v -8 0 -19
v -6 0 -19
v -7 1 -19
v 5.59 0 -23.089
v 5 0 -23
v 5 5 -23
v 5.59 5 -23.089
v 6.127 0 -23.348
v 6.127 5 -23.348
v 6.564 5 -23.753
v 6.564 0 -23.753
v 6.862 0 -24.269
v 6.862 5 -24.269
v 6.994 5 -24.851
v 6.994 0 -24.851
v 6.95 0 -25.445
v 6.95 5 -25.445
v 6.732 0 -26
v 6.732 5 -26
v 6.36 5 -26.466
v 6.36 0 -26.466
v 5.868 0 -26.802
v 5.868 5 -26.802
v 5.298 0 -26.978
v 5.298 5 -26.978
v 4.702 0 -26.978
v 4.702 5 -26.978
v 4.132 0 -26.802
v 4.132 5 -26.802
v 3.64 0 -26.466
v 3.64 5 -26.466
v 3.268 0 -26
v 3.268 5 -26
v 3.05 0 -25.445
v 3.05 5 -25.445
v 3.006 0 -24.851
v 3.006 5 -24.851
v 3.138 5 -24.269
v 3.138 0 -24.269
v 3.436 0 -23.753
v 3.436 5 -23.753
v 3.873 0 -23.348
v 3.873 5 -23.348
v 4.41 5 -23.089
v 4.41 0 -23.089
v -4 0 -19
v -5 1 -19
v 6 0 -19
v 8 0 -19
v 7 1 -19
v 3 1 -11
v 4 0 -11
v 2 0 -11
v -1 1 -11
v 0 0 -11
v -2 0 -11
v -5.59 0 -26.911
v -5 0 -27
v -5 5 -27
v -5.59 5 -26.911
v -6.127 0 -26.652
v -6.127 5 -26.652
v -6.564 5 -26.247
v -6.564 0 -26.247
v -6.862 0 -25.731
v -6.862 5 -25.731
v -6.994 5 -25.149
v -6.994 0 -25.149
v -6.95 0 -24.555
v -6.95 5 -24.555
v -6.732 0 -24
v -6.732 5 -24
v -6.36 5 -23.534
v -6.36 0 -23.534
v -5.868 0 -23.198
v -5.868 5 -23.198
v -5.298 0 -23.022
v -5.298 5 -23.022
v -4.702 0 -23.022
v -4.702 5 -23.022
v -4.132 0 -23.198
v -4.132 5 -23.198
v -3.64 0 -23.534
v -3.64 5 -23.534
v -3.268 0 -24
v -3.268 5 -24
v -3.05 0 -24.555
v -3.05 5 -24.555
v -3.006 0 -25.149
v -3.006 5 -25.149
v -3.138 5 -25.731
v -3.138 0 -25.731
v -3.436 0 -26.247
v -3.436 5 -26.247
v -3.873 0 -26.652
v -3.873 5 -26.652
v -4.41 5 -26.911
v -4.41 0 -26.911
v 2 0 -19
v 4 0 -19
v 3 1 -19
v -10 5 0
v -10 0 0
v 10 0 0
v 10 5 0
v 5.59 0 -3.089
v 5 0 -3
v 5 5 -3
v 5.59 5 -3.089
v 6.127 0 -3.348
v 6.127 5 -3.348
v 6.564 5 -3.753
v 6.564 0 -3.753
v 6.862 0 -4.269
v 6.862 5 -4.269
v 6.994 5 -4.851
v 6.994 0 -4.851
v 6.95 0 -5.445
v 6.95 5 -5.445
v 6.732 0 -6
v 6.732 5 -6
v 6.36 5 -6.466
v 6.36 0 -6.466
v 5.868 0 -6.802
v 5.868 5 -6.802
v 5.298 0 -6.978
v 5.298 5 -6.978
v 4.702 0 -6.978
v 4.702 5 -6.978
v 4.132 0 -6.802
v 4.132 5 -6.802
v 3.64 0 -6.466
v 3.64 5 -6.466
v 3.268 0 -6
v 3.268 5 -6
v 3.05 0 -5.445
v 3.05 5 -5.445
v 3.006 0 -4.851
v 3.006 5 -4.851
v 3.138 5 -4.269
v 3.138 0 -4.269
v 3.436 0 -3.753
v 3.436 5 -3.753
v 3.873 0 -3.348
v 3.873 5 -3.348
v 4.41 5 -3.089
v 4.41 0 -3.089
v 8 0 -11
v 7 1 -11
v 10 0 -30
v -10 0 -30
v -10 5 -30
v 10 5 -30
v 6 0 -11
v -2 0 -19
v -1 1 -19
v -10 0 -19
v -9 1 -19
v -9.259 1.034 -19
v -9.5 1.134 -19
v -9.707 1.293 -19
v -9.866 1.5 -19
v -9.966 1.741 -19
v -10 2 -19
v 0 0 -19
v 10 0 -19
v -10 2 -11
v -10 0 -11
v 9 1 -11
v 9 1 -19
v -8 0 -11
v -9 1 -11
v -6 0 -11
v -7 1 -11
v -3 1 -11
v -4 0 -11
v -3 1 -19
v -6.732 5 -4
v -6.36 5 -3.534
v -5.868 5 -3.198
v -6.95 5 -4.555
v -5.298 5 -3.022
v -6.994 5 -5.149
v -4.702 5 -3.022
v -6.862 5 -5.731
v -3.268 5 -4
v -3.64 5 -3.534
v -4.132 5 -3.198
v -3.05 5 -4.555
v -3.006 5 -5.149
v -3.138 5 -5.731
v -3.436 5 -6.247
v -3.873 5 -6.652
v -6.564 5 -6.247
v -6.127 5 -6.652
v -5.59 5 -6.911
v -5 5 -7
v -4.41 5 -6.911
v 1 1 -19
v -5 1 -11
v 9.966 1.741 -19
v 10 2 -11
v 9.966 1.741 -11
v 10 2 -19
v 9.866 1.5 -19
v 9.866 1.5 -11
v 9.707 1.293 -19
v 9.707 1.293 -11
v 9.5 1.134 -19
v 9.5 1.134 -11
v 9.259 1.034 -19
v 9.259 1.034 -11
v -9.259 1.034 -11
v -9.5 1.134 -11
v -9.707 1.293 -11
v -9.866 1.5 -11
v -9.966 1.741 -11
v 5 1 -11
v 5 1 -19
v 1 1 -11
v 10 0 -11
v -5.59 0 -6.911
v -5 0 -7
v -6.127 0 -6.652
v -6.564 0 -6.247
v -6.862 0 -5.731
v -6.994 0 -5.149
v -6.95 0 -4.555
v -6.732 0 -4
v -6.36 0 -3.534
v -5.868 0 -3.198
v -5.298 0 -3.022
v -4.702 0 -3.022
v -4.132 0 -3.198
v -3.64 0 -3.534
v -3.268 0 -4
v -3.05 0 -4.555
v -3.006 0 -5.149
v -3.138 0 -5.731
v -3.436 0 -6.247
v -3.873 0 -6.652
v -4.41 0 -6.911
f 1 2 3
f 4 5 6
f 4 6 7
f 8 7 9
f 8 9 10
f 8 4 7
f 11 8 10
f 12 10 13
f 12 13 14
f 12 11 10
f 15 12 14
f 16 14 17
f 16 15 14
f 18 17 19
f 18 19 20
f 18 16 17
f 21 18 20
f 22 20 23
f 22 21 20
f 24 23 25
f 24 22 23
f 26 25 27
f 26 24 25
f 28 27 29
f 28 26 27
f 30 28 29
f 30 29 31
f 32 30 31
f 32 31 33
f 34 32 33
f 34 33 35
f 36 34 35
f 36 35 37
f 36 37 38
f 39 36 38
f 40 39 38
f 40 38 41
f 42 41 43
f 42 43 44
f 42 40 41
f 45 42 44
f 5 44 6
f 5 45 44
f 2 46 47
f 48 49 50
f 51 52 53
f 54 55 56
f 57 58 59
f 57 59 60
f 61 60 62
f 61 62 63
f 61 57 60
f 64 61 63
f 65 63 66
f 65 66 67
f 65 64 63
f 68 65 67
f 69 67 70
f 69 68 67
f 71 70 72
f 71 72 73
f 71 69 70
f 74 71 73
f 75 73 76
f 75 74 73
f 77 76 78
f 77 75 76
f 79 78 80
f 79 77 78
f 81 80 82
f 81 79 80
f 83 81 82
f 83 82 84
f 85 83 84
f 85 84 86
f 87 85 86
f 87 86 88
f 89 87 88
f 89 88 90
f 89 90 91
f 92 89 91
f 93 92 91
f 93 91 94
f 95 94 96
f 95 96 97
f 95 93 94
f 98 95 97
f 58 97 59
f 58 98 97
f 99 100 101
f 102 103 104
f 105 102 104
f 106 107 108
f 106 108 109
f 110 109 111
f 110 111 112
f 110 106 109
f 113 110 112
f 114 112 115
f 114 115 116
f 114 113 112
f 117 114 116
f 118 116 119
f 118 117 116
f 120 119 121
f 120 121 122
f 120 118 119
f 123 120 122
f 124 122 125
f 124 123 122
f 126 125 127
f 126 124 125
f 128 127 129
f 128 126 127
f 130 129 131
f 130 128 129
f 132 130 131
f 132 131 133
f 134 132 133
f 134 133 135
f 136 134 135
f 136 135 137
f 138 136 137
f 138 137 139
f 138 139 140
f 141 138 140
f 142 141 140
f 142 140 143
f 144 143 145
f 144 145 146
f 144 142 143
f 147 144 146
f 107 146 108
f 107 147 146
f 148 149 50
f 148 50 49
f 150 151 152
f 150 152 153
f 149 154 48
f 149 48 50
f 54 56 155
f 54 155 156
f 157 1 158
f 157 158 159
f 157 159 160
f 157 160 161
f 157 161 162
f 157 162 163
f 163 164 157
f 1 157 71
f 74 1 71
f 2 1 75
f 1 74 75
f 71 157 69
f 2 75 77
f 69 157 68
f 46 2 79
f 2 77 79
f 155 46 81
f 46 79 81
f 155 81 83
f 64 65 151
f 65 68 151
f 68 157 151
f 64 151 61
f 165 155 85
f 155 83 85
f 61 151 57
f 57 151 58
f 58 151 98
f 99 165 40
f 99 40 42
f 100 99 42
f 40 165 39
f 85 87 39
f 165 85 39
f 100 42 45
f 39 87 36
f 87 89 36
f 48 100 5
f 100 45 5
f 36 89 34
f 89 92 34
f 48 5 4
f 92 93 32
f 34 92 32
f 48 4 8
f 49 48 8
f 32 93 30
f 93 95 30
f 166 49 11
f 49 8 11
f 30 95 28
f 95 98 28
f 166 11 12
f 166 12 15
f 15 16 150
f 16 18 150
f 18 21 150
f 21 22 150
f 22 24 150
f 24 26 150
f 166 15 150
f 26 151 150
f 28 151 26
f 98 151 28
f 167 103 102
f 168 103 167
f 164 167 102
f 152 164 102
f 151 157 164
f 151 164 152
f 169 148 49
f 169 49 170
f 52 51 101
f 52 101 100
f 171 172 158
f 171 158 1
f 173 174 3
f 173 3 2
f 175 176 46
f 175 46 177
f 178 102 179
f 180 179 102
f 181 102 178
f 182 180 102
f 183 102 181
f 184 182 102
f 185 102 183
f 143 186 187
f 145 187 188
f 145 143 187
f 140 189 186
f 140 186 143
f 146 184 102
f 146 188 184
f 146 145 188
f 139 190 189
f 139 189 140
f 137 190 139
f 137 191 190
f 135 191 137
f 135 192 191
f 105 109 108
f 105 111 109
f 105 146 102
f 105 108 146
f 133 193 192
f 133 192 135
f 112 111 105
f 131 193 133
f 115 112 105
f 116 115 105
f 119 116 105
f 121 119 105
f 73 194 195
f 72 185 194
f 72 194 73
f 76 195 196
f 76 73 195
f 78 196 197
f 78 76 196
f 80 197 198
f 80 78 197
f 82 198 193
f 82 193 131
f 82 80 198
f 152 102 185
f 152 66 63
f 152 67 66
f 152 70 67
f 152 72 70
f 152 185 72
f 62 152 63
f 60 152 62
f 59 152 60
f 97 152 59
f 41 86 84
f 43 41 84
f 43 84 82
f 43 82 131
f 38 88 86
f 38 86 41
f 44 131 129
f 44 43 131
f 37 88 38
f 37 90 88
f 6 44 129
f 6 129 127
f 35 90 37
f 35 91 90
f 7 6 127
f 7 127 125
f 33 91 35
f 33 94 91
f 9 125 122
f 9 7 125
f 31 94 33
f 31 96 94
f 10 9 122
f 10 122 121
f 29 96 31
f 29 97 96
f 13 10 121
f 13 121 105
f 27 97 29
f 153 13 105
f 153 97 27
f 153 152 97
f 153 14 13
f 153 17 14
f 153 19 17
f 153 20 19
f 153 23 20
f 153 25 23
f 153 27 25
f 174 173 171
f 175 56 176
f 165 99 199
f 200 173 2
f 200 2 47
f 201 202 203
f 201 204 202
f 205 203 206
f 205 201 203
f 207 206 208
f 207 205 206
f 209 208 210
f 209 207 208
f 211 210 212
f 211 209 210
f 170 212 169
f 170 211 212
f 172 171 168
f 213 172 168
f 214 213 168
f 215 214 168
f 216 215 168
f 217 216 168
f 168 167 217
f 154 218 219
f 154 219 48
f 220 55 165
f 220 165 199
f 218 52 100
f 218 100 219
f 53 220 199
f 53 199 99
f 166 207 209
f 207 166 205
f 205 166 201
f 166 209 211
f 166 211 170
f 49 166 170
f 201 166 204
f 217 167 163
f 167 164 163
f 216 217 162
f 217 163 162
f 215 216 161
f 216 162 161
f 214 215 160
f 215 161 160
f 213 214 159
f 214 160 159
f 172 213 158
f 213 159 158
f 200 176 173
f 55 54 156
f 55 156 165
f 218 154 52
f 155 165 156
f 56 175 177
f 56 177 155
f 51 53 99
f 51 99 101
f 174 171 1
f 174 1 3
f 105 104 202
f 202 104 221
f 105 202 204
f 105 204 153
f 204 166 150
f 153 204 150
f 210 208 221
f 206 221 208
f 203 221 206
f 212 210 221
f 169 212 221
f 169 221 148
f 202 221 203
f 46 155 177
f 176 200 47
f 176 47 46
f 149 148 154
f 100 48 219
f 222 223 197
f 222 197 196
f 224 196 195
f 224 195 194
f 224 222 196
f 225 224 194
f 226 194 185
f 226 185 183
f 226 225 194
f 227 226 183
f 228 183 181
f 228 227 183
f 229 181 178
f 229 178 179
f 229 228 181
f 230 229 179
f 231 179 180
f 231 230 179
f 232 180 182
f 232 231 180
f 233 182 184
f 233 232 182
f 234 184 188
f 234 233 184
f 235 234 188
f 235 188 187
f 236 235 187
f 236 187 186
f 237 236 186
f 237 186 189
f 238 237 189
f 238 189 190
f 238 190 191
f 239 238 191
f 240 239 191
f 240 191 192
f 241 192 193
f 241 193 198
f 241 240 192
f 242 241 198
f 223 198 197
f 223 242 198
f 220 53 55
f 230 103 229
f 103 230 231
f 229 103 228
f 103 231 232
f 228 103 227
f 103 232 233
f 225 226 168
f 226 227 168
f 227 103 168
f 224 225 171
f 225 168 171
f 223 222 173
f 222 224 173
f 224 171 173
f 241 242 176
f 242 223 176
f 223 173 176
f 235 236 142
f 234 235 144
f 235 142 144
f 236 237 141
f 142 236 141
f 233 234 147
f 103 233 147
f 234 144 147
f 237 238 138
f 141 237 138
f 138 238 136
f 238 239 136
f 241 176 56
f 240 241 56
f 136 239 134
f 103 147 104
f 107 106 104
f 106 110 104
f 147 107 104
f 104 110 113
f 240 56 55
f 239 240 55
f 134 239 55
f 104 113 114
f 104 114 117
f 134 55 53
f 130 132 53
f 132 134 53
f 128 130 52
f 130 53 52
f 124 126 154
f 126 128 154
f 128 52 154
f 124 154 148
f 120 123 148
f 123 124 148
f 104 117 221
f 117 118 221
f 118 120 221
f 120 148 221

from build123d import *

# Parameters (mm, degrees)
SKETCH_1_W               = 20
SKETCH_1_H               = 30
SKETCH_1_R               = 2
EXTRUDE_1_DEPTH          = 5
CUT_EXTRUDE_6_DEPTH      = 4
CUT_EXTRUDE_6_DEPTH_BACK = 4
CUT_EXTRUDE_6_START      = -15
FILLET_1_R               = 1


with BuildPart() as part:
    # 스케치1 → 보스-돌출1 (new body)
    with BuildSketch(Plane(origin=(0, 0, 0), x_dir=(1, 0, 0), z_dir=(0, 1, 0))):
        with Locations((0, 15)):
            Rectangle(SKETCH_1_W, SKETCH_1_H)
        with Locations(Location((5, 25, 0), (0, 0, 270))):
            Circle(SKETCH_1_R, mode=Mode.SUBTRACT)
        with Locations(Location((-5, 25, 0), (0, 0, 90))):
            Circle(SKETCH_1_R, mode=Mode.SUBTRACT)
        with Locations(Location((5, 5, 0), (0, 0, 270))):
            Circle(SKETCH_1_R, mode=Mode.SUBTRACT)
        with Locations(Location((-5, 5, 0), (0, 0, 90))):
            Circle(SKETCH_1_R, mode=Mode.SUBTRACT)
    extrude(amount=EXTRUDE_1_DEPTH)

    # 스케치3 → 컷-돌출6 (cut, two sides: drawn at the far end of the back side and taken through both)
    with BuildSketch(Plane(origin=(0, 0, -30), x_dir=(-1, 0, 0), z_dir=(0, 0, -1)).offset(CUT_EXTRUDE_6_START - CUT_EXTRUDE_6_DEPTH_BACK)):
        Polygon((0, 0), (-1, 1), (-2, 0), align=None)
        Polygon((1, 1), (0, 0), (2, 0), align=None)
        Polygon((-2, 0), (-3, 1), (-4, 0), align=None)
        Polygon((3, 1), (2, 0), (4, 0), align=None)
        Polygon((-4, 0), (-5, 1), (-6, 0), align=None)
        Polygon((5, 1), (4, 0), (6, 0), align=None)
        Polygon((-6, 0), (-7, 1), (-8, 0), align=None)
        Polygon((7, 1), (6, 0), (8, 0), align=None)
        Polygon((-8, 0), (-9, 1), (-10, 1), (-10, 0), align=None)
        Polygon((9, 1), (8, 0), (10, 0), (10, 1), align=None)
    extrude(amount=CUT_EXTRUDE_6_DEPTH + CUT_EXTRUDE_6_DEPTH_BACK, mode=Mode.SUBTRACT)

    # 필렛1
    fillet_1_edges = [part.edges().sort_by_distance(p)[0] for p in [
        (10, 1, -15),
        (-10, 1, -15),
    ]]
    fillet(fillet_1_edges, radius=FILLET_1_R - 0.0001)  # a hair under: the kernel refuses the full size


solid = part.part
